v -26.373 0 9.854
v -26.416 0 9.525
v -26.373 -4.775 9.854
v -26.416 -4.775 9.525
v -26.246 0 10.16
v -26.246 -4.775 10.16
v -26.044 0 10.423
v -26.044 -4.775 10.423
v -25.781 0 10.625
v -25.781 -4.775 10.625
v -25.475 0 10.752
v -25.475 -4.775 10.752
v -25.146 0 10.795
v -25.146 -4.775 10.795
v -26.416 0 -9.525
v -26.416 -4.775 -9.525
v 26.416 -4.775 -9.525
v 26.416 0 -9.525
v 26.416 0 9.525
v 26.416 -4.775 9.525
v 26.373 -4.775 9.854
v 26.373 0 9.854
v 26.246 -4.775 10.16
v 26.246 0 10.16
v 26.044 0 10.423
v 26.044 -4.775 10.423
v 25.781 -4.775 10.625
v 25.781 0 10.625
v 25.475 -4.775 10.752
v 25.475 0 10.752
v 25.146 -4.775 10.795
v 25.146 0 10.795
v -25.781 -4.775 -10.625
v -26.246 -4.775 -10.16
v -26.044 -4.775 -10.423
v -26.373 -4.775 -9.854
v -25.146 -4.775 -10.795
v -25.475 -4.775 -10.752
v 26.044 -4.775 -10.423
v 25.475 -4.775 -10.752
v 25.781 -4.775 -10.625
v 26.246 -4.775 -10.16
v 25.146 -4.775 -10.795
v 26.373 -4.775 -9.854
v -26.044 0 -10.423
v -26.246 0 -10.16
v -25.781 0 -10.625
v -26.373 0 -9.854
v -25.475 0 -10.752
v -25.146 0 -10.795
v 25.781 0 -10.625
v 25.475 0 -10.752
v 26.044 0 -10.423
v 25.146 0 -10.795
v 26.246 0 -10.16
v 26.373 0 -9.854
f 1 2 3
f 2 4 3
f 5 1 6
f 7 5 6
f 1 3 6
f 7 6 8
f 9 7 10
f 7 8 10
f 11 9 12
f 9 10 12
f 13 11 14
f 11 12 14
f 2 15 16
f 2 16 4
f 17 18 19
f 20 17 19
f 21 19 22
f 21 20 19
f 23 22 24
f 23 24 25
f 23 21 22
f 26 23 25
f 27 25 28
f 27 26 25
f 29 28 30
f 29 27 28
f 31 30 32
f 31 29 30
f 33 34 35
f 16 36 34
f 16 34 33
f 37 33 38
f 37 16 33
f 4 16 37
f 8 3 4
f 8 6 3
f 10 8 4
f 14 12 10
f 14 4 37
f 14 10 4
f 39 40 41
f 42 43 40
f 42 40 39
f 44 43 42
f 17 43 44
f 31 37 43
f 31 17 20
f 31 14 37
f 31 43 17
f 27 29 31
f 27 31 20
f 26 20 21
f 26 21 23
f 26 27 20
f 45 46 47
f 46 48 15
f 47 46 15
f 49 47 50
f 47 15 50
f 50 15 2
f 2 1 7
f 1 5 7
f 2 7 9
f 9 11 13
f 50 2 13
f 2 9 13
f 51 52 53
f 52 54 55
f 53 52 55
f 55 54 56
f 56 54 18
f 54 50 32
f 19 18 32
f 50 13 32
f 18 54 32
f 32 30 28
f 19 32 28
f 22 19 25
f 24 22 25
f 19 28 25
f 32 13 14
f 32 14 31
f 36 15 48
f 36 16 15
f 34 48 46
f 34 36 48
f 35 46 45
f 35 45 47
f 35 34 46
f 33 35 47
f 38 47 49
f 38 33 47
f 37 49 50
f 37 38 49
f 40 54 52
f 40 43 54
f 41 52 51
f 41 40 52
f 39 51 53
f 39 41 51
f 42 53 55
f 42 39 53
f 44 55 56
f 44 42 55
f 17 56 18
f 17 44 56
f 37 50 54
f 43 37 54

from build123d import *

# Parameters (mm, degrees)
F0_W     = 52.832
F0_H     = 21.59
F1_DEPTH = 4.7752
F2_R     = 1.27


with BuildPart() as f1:
    # F0 (on Front) → F1 (new body)
    with BuildSketch(Plane.XZ):
        Rectangle(F0_W, F0_H)
    extrude(amount=F1_DEPTH)

    # F2
    f2_edges = [f1.edges().sort_by_distance(p)[0] for p in [
        (-26.416, -2.3876, 10.795),
        (26.416, -2.3876, 10.795),
        (26.416, -2.3876, -10.795),
        (-26.416, -2.3876, -10.795),
    ]]
    fillet(f2_edges, radius=F2_R)


with BuildPart() as f3_1:
    # F3: copy of F1
    add(f1.part)


solid = f1.part
